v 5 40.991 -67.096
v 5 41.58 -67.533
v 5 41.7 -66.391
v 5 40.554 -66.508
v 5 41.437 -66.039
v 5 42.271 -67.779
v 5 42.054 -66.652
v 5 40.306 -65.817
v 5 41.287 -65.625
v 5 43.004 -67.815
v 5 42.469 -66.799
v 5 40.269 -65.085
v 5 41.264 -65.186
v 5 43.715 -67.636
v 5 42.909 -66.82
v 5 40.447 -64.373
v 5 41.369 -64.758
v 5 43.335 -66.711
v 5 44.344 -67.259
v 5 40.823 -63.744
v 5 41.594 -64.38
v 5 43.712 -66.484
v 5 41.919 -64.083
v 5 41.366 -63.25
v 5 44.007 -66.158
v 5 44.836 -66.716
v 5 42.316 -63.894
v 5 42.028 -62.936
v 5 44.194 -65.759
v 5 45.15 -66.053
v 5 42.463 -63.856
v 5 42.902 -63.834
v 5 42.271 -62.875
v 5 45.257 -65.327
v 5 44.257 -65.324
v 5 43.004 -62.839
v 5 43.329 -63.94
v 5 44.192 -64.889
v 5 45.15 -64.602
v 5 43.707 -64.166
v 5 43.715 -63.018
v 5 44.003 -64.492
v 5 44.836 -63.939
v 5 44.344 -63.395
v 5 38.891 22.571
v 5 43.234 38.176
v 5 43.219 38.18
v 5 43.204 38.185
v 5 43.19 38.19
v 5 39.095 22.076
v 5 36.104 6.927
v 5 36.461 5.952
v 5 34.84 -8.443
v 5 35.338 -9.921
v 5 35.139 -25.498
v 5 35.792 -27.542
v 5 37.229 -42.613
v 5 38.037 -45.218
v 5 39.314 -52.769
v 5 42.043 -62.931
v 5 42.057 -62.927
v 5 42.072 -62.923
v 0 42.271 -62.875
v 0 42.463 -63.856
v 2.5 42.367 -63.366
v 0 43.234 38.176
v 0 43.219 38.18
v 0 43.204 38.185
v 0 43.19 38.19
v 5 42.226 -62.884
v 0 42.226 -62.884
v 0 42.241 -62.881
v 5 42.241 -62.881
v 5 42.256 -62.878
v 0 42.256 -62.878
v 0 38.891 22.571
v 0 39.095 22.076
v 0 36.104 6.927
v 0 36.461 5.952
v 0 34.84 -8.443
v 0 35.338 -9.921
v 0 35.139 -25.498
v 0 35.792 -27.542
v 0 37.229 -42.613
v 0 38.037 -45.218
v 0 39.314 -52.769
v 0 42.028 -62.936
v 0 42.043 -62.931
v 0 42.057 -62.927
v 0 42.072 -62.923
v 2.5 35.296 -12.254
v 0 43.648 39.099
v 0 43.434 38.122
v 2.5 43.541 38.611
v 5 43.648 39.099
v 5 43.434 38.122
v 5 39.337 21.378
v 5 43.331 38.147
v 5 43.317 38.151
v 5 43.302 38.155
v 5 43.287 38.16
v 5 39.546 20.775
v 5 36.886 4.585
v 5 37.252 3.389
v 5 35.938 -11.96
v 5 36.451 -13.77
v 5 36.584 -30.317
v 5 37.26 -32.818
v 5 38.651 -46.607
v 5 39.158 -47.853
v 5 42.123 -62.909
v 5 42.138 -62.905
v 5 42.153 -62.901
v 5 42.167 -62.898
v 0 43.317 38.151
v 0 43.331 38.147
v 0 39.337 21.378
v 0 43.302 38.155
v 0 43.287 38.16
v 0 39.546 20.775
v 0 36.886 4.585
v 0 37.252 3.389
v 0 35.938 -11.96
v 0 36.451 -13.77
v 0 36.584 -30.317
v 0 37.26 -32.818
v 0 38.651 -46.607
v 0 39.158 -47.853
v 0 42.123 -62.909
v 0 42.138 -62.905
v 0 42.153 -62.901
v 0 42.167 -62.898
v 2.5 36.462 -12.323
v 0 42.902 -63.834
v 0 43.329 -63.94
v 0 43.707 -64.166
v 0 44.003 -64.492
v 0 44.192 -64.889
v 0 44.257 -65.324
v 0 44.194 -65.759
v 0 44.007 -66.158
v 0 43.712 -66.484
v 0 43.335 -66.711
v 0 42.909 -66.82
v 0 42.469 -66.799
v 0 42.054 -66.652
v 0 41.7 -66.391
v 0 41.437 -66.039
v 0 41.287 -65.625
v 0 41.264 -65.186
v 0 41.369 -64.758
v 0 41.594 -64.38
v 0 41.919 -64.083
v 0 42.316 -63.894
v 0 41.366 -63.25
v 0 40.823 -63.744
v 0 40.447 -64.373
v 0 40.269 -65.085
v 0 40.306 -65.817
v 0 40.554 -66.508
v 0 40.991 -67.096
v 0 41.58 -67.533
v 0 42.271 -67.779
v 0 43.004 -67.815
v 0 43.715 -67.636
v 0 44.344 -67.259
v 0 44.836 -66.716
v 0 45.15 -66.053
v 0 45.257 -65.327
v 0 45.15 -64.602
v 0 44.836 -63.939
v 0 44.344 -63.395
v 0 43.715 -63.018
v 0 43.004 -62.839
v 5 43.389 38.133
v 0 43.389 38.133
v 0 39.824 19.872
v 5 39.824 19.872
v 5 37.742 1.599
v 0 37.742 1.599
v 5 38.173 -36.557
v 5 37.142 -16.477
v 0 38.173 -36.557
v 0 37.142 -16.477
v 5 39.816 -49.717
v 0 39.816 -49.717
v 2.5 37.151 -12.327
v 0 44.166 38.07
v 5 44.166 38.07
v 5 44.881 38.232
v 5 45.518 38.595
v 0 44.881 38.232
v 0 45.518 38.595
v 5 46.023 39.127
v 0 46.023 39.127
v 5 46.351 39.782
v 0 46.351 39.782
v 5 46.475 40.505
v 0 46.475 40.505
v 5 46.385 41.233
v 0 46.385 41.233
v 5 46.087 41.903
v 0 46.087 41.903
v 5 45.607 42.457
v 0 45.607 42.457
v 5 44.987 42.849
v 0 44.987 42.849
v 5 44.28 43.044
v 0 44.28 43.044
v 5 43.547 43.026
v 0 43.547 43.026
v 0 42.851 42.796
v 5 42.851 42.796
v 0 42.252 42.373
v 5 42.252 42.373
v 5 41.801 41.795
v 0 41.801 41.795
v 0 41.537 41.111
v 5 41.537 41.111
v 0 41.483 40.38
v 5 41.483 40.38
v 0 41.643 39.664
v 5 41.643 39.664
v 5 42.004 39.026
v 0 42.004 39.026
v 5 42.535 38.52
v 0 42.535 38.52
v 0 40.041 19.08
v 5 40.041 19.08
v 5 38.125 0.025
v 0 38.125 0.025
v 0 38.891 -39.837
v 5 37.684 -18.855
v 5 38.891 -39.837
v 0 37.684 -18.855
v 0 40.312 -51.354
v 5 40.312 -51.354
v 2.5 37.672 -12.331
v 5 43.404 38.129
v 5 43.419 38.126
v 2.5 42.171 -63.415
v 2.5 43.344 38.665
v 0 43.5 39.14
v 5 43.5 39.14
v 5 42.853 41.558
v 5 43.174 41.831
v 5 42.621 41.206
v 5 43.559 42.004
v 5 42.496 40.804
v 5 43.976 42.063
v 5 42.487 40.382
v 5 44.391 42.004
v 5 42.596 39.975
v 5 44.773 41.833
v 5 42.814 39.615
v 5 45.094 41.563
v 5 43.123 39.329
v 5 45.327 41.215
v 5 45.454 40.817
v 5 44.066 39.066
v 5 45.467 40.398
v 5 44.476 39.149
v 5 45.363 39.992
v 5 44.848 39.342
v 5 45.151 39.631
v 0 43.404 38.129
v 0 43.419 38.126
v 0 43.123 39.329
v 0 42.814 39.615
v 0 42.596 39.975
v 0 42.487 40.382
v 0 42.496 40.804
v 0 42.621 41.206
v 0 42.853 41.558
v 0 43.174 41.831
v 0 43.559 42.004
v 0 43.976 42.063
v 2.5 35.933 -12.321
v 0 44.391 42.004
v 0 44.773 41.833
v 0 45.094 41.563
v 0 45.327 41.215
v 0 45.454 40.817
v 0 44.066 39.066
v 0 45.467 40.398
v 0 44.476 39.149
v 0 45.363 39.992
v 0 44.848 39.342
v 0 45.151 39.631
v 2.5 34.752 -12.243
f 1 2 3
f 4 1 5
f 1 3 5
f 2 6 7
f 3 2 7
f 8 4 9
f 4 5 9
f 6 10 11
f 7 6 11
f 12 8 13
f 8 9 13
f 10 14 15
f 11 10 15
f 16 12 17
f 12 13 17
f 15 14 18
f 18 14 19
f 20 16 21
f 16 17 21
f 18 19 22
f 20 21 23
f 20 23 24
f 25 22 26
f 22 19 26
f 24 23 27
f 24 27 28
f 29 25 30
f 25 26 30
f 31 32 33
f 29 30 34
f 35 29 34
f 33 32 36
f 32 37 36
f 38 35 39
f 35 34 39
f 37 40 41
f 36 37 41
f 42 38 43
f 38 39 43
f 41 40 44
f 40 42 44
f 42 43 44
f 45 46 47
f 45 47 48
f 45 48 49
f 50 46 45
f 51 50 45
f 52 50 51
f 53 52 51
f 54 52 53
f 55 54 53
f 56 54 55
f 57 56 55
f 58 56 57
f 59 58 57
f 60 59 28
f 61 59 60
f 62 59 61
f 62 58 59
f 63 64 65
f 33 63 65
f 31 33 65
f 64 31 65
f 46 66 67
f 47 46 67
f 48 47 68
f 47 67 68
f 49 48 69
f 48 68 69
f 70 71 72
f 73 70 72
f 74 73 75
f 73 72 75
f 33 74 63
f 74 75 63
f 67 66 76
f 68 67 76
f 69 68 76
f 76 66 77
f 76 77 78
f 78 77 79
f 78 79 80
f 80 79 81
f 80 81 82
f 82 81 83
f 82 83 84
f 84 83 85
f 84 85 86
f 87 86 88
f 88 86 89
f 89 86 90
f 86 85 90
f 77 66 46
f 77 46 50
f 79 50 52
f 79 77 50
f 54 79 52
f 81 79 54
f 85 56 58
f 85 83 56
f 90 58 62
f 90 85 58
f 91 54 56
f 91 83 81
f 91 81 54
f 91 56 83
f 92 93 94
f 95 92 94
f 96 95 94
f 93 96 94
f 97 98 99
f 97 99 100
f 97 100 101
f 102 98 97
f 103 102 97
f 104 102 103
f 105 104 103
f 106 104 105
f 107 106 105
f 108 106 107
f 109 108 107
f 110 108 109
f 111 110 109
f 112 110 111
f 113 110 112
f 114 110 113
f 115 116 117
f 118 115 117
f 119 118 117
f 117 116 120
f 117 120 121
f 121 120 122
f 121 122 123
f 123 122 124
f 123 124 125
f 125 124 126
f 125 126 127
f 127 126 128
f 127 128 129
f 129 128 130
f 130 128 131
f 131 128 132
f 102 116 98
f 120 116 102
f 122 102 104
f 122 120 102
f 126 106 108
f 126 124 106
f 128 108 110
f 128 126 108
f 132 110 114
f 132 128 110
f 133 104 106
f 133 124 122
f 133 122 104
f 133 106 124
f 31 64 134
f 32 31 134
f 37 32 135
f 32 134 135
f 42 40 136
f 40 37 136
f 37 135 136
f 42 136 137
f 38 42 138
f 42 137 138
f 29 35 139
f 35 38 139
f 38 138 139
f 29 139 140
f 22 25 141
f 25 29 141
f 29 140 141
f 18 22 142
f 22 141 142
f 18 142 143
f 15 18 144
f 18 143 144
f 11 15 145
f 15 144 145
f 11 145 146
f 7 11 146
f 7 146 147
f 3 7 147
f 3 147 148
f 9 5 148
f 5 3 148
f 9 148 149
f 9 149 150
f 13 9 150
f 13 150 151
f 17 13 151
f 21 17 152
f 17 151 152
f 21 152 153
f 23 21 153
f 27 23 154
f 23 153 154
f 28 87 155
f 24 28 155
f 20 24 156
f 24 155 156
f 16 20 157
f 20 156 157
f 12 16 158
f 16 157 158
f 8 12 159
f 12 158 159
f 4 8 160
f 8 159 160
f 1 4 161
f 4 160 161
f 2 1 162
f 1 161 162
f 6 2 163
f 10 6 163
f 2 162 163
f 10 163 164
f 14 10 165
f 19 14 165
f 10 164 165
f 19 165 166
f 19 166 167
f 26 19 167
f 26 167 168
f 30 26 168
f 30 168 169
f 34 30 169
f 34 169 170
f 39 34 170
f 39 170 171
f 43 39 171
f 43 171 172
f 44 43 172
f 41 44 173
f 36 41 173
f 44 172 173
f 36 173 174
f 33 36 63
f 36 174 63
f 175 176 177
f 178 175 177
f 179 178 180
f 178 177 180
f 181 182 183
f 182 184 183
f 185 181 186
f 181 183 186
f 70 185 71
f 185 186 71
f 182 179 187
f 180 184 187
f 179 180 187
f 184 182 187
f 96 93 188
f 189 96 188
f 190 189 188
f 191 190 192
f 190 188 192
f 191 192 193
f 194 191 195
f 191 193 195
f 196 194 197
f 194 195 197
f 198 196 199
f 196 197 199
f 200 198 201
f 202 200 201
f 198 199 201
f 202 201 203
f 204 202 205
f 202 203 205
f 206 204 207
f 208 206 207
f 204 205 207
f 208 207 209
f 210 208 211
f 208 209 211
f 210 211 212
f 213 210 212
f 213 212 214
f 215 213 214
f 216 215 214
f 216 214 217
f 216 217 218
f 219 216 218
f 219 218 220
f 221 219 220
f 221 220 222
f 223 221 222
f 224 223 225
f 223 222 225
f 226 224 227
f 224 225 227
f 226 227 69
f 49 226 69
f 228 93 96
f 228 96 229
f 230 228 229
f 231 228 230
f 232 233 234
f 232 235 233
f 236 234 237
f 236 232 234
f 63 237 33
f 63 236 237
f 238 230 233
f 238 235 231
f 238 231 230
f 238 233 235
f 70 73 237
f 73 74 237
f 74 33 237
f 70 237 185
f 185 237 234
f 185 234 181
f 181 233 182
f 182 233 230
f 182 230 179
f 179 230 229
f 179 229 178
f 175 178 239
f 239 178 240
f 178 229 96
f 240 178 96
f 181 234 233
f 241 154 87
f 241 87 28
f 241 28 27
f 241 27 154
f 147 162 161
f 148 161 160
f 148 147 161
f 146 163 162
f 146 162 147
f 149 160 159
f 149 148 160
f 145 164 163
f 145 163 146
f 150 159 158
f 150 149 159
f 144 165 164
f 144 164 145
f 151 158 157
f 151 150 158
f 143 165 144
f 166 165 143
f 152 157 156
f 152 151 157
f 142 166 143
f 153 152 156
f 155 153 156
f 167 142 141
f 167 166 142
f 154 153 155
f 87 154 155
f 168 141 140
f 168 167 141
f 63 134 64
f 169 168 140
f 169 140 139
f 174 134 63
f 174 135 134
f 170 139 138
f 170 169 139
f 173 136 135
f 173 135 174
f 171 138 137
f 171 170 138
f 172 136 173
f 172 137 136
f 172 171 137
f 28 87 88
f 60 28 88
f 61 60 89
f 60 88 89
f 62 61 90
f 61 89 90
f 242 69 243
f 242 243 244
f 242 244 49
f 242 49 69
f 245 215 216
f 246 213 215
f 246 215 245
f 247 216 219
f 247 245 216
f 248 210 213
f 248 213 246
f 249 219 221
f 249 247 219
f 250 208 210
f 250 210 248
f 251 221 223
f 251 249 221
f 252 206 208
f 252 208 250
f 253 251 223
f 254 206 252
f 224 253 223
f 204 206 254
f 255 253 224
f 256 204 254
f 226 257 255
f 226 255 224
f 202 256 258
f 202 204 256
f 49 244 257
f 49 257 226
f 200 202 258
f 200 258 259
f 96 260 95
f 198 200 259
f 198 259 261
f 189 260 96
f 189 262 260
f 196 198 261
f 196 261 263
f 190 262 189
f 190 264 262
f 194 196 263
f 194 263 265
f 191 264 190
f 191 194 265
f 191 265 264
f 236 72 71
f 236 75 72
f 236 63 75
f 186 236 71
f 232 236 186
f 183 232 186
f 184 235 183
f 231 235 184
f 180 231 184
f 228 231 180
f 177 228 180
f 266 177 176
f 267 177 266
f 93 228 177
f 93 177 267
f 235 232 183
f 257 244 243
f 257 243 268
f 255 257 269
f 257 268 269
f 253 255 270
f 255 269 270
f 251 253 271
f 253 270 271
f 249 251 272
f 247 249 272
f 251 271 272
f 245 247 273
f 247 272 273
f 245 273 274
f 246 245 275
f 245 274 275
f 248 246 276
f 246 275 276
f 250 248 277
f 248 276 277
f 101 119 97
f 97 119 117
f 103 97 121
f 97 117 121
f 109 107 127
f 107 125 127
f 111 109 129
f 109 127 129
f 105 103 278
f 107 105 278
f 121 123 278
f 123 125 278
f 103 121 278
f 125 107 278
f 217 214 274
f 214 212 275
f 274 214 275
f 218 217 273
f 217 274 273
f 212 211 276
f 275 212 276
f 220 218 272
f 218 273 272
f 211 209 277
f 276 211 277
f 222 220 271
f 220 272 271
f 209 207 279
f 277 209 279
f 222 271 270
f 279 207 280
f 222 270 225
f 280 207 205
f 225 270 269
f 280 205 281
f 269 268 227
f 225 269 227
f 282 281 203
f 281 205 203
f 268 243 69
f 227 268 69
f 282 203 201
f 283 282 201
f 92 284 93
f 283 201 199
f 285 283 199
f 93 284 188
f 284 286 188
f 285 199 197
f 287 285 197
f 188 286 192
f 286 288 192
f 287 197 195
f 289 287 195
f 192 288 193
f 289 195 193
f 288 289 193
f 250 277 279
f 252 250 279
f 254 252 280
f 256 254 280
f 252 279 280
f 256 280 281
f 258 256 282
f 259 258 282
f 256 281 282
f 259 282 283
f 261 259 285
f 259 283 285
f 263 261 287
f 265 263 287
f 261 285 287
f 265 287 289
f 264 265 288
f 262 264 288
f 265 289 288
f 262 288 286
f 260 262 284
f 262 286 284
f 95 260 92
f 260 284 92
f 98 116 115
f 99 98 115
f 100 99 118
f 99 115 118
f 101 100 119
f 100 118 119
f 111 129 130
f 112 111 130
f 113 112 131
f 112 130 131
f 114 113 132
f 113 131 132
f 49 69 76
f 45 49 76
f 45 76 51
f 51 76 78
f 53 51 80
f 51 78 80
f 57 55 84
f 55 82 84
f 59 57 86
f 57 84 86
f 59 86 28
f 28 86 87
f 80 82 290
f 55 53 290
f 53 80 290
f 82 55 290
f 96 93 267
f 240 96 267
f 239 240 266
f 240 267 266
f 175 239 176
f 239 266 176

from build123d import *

# Parameters (mm, degrees)
BOSS_EXTRUDE1_DEPTH   = 5
BOSS_EXTRUDE1_2_DEPTH = 5
BOSS_EXTRUDE1_3_DEPTH = 5
BOSS_EXTRUDE1_4_DEPTH = 5
BOSS_EXTRUDE1_5_DEPTH = 5
SKETCH2_R             = 1.5
CUT_EXTRUDE1_DEPTH    = 5
SKETCH3_R             = 1.5
CUT_EXTRUDE2_DEPTH    = 5


with BuildPart() as part:
    # Sketch1 → Boss-Extrude1 (new body)
    with BuildSketch(Plane(origin=(0, 0, 0), x_dir=(0, 0, -1), z_dir=(1, 0, 0))):
        with BuildLine():
            ThreePointArc((-38.122303186, 43.434112385), (-42.972794517, 44.641032213), (-38.189737765, 43.189725997))
            add(Edge.make_bspline(
                [(-40.562857582, 43.976048027), (-39.376442717, 43.574141343), (-38.189737765, 43.189725997)],
                knots=[0, 0, 0, 0.022530034, 0.022530034, 0.022530034], degree=2))
            add(Edge.make_bspline(
                [(-40.562857582, 43.976048027), (-39.342633869, 43.699008033), (-38.122303186, 43.434112385)],
                knots=[0, 0, 0, 0.023090755, 0.023090755, 0.023090755], degree=2))
        make_face()
    extrude(amount=BOSS_EXTRUDE1_DEPTH)

    # Sketch3 → Cut-Extrude2 (cut)
    with BuildSketch(Plane.ZY):
        with Locations((40.562857582, 43.976048027)):
            Circle(SKETCH3_R)
    extrude(amount=-CUT_EXTRUDE2_DEPTH, mode=Mode.SUBTRACT)


with BuildPart() as body_2:
    # Sketch1 → Boss-Extrude1 2 (new body)
    with BuildSketch(Plane(origin=(0, 0, 0), x_dir=(0, 0, -1), z_dir=(1, 0, 0))):
        with BuildLine():
            ThreePointArc((-38.175634118, 43.233643736), (-38.18258465, 43.211652338), (-38.189737765, 43.189725997))
            add(Edge.make_bspline(
                [(-38.189737765, 43.189725997), (12.112467762, 26.895077773), (62.935887165, 42.028055975)],
                knots=[0.022530034, 0.022530034, 0.022530034, 0.977536067, 0.977536067, 0.977536067], degree=2))
            ThreePointArc((62.935887165, 42.028055975), (62.929313429, 42.049968592), (62.922940487, 42.071940447))
            add(Edge.make_bspline(
                [(-38.175634118, 43.233643736), (12.133861989, 27.938763262), (62.922940487, 42.071940447)],
                knots=[0.02265438, 0.02265438, 0.02265438, 0.977405016, 0.977405016, 0.977405016], degree=2))
        make_face()
    extrude(amount=BOSS_EXTRUDE1_2_DEPTH)


with BuildPart() as body_3:
    # Sketch1 → Boss-Extrude1 3 (new body)
    with BuildSketch(Plane(origin=(0, 0, 0), x_dir=(0, 0, -1), z_dir=(1, 0, 0))):
        with BuildLine():
            add(Edge.make_bspline(
                [(-38.122303186, 43.434112385), (12.28502649, 32.492256674), (62.874870389, 42.27119892)],
                knots=[0.023090755, 0.023090755, 0.023090755, 0.97688411, 0.97688411, 0.97688411], degree=2))
            ThreePointArc((-38.122303186, 43.434112385), (-38.127373449, 43.411763489), (-38.132648364, 43.389462009))
            add(Edge.make_bspline(
                [(-38.132648364, 43.389462009), (12.279014036, 31.494728117), (62.884230024, 42.226164301)],
                knots=[0.022995442, 0.022995442, 0.022995442, 0.976974897, 0.976974897, 0.976974897], degree=2))
            ThreePointArc((62.884230024, 42.226164301), (62.879446631, 42.248660084), (62.874870389, 42.27119892))
        make_face()
    extrude(amount=BOSS_EXTRUDE1_3_DEPTH)


with BuildPart() as body_4:
    # Sketch1 → Boss-Extrude1 4 (new body)
    with BuildSketch(Plane(origin=(0, 0, 0), x_dir=(0, 0, -1), z_dir=(1, 0, 0))):
        with BuildLine():
            add(Edge.make_bspline(
                [(62.935887165, 42.028055975), (64.131370598, 42.384018344), (65.327142418, 42.757369565)],
                knots=[0.977536067, 0.977536067, 0.977536067, 1, 1, 1], degree=2))
            ThreePointArc((62.935887165, 42.028055975), (67.751955557, 43.365876955), (62.874870389, 42.27119892))
            add(Edge.make_bspline(
                [(62.874870389, 42.27119892), (64.100952802, 42.508198843), (65.327142418, 42.757369565)],
                knots=[0.97688411, 0.97688411, 0.97688411, 1, 1, 1], degree=2))
        make_face()
    extrude(amount=BOSS_EXTRUDE1_4_DEPTH)

    # Sketch2 → Cut-Extrude1 (cut)
    with BuildSketch(Plane.ZY):
        with Locations((-65.327142418, 42.757369565)):
            Circle(SKETCH2_R)
    extrude(amount=-CUT_EXTRUDE1_DEPTH, mode=Mode.SUBTRACT)


with BuildPart() as body_5:
    # Sketch1 → Boss-Extrude1 5 (new body)
    with BuildSketch(Plane(origin=(0, 0, 0), x_dir=(0, 0, -1), z_dir=(1, 0, 0))):
        with BuildLine():
            ThreePointArc((-38.147423994, 43.331315072), (-38.15340299, 43.30931827), (-38.159582301, 43.287376899))
            add(Edge.make_bspline(
                [(-38.159582301, 43.287376899), (12.266884665, 29.160914613), (62.908962274, 42.12301573)],
                knots=[0.022745643, 0.022745643, 0.022745643, 0.977213051, 0.977213051, 0.977213051], degree=2))
            ThreePointArc((62.908962274, 42.12301573), (62.903250135, 42.145204392), (62.89774159, 42.167444473))
            add(Edge.make_bspline(
                [(-38.147423994, 43.331315072), (12.271822374, 30.175168393), (62.89774159, 42.167444473)],
                knots=[0.022858657, 0.022858657, 0.022858657, 0.977105265, 0.977105265, 0.977105265], degree=2))
        make_face()
    extrude(amount=BOSS_EXTRUDE1_5_DEPTH)


solid = Compound([part.part, body_2.part, body_3.part, body_4.part, body_5.part])
